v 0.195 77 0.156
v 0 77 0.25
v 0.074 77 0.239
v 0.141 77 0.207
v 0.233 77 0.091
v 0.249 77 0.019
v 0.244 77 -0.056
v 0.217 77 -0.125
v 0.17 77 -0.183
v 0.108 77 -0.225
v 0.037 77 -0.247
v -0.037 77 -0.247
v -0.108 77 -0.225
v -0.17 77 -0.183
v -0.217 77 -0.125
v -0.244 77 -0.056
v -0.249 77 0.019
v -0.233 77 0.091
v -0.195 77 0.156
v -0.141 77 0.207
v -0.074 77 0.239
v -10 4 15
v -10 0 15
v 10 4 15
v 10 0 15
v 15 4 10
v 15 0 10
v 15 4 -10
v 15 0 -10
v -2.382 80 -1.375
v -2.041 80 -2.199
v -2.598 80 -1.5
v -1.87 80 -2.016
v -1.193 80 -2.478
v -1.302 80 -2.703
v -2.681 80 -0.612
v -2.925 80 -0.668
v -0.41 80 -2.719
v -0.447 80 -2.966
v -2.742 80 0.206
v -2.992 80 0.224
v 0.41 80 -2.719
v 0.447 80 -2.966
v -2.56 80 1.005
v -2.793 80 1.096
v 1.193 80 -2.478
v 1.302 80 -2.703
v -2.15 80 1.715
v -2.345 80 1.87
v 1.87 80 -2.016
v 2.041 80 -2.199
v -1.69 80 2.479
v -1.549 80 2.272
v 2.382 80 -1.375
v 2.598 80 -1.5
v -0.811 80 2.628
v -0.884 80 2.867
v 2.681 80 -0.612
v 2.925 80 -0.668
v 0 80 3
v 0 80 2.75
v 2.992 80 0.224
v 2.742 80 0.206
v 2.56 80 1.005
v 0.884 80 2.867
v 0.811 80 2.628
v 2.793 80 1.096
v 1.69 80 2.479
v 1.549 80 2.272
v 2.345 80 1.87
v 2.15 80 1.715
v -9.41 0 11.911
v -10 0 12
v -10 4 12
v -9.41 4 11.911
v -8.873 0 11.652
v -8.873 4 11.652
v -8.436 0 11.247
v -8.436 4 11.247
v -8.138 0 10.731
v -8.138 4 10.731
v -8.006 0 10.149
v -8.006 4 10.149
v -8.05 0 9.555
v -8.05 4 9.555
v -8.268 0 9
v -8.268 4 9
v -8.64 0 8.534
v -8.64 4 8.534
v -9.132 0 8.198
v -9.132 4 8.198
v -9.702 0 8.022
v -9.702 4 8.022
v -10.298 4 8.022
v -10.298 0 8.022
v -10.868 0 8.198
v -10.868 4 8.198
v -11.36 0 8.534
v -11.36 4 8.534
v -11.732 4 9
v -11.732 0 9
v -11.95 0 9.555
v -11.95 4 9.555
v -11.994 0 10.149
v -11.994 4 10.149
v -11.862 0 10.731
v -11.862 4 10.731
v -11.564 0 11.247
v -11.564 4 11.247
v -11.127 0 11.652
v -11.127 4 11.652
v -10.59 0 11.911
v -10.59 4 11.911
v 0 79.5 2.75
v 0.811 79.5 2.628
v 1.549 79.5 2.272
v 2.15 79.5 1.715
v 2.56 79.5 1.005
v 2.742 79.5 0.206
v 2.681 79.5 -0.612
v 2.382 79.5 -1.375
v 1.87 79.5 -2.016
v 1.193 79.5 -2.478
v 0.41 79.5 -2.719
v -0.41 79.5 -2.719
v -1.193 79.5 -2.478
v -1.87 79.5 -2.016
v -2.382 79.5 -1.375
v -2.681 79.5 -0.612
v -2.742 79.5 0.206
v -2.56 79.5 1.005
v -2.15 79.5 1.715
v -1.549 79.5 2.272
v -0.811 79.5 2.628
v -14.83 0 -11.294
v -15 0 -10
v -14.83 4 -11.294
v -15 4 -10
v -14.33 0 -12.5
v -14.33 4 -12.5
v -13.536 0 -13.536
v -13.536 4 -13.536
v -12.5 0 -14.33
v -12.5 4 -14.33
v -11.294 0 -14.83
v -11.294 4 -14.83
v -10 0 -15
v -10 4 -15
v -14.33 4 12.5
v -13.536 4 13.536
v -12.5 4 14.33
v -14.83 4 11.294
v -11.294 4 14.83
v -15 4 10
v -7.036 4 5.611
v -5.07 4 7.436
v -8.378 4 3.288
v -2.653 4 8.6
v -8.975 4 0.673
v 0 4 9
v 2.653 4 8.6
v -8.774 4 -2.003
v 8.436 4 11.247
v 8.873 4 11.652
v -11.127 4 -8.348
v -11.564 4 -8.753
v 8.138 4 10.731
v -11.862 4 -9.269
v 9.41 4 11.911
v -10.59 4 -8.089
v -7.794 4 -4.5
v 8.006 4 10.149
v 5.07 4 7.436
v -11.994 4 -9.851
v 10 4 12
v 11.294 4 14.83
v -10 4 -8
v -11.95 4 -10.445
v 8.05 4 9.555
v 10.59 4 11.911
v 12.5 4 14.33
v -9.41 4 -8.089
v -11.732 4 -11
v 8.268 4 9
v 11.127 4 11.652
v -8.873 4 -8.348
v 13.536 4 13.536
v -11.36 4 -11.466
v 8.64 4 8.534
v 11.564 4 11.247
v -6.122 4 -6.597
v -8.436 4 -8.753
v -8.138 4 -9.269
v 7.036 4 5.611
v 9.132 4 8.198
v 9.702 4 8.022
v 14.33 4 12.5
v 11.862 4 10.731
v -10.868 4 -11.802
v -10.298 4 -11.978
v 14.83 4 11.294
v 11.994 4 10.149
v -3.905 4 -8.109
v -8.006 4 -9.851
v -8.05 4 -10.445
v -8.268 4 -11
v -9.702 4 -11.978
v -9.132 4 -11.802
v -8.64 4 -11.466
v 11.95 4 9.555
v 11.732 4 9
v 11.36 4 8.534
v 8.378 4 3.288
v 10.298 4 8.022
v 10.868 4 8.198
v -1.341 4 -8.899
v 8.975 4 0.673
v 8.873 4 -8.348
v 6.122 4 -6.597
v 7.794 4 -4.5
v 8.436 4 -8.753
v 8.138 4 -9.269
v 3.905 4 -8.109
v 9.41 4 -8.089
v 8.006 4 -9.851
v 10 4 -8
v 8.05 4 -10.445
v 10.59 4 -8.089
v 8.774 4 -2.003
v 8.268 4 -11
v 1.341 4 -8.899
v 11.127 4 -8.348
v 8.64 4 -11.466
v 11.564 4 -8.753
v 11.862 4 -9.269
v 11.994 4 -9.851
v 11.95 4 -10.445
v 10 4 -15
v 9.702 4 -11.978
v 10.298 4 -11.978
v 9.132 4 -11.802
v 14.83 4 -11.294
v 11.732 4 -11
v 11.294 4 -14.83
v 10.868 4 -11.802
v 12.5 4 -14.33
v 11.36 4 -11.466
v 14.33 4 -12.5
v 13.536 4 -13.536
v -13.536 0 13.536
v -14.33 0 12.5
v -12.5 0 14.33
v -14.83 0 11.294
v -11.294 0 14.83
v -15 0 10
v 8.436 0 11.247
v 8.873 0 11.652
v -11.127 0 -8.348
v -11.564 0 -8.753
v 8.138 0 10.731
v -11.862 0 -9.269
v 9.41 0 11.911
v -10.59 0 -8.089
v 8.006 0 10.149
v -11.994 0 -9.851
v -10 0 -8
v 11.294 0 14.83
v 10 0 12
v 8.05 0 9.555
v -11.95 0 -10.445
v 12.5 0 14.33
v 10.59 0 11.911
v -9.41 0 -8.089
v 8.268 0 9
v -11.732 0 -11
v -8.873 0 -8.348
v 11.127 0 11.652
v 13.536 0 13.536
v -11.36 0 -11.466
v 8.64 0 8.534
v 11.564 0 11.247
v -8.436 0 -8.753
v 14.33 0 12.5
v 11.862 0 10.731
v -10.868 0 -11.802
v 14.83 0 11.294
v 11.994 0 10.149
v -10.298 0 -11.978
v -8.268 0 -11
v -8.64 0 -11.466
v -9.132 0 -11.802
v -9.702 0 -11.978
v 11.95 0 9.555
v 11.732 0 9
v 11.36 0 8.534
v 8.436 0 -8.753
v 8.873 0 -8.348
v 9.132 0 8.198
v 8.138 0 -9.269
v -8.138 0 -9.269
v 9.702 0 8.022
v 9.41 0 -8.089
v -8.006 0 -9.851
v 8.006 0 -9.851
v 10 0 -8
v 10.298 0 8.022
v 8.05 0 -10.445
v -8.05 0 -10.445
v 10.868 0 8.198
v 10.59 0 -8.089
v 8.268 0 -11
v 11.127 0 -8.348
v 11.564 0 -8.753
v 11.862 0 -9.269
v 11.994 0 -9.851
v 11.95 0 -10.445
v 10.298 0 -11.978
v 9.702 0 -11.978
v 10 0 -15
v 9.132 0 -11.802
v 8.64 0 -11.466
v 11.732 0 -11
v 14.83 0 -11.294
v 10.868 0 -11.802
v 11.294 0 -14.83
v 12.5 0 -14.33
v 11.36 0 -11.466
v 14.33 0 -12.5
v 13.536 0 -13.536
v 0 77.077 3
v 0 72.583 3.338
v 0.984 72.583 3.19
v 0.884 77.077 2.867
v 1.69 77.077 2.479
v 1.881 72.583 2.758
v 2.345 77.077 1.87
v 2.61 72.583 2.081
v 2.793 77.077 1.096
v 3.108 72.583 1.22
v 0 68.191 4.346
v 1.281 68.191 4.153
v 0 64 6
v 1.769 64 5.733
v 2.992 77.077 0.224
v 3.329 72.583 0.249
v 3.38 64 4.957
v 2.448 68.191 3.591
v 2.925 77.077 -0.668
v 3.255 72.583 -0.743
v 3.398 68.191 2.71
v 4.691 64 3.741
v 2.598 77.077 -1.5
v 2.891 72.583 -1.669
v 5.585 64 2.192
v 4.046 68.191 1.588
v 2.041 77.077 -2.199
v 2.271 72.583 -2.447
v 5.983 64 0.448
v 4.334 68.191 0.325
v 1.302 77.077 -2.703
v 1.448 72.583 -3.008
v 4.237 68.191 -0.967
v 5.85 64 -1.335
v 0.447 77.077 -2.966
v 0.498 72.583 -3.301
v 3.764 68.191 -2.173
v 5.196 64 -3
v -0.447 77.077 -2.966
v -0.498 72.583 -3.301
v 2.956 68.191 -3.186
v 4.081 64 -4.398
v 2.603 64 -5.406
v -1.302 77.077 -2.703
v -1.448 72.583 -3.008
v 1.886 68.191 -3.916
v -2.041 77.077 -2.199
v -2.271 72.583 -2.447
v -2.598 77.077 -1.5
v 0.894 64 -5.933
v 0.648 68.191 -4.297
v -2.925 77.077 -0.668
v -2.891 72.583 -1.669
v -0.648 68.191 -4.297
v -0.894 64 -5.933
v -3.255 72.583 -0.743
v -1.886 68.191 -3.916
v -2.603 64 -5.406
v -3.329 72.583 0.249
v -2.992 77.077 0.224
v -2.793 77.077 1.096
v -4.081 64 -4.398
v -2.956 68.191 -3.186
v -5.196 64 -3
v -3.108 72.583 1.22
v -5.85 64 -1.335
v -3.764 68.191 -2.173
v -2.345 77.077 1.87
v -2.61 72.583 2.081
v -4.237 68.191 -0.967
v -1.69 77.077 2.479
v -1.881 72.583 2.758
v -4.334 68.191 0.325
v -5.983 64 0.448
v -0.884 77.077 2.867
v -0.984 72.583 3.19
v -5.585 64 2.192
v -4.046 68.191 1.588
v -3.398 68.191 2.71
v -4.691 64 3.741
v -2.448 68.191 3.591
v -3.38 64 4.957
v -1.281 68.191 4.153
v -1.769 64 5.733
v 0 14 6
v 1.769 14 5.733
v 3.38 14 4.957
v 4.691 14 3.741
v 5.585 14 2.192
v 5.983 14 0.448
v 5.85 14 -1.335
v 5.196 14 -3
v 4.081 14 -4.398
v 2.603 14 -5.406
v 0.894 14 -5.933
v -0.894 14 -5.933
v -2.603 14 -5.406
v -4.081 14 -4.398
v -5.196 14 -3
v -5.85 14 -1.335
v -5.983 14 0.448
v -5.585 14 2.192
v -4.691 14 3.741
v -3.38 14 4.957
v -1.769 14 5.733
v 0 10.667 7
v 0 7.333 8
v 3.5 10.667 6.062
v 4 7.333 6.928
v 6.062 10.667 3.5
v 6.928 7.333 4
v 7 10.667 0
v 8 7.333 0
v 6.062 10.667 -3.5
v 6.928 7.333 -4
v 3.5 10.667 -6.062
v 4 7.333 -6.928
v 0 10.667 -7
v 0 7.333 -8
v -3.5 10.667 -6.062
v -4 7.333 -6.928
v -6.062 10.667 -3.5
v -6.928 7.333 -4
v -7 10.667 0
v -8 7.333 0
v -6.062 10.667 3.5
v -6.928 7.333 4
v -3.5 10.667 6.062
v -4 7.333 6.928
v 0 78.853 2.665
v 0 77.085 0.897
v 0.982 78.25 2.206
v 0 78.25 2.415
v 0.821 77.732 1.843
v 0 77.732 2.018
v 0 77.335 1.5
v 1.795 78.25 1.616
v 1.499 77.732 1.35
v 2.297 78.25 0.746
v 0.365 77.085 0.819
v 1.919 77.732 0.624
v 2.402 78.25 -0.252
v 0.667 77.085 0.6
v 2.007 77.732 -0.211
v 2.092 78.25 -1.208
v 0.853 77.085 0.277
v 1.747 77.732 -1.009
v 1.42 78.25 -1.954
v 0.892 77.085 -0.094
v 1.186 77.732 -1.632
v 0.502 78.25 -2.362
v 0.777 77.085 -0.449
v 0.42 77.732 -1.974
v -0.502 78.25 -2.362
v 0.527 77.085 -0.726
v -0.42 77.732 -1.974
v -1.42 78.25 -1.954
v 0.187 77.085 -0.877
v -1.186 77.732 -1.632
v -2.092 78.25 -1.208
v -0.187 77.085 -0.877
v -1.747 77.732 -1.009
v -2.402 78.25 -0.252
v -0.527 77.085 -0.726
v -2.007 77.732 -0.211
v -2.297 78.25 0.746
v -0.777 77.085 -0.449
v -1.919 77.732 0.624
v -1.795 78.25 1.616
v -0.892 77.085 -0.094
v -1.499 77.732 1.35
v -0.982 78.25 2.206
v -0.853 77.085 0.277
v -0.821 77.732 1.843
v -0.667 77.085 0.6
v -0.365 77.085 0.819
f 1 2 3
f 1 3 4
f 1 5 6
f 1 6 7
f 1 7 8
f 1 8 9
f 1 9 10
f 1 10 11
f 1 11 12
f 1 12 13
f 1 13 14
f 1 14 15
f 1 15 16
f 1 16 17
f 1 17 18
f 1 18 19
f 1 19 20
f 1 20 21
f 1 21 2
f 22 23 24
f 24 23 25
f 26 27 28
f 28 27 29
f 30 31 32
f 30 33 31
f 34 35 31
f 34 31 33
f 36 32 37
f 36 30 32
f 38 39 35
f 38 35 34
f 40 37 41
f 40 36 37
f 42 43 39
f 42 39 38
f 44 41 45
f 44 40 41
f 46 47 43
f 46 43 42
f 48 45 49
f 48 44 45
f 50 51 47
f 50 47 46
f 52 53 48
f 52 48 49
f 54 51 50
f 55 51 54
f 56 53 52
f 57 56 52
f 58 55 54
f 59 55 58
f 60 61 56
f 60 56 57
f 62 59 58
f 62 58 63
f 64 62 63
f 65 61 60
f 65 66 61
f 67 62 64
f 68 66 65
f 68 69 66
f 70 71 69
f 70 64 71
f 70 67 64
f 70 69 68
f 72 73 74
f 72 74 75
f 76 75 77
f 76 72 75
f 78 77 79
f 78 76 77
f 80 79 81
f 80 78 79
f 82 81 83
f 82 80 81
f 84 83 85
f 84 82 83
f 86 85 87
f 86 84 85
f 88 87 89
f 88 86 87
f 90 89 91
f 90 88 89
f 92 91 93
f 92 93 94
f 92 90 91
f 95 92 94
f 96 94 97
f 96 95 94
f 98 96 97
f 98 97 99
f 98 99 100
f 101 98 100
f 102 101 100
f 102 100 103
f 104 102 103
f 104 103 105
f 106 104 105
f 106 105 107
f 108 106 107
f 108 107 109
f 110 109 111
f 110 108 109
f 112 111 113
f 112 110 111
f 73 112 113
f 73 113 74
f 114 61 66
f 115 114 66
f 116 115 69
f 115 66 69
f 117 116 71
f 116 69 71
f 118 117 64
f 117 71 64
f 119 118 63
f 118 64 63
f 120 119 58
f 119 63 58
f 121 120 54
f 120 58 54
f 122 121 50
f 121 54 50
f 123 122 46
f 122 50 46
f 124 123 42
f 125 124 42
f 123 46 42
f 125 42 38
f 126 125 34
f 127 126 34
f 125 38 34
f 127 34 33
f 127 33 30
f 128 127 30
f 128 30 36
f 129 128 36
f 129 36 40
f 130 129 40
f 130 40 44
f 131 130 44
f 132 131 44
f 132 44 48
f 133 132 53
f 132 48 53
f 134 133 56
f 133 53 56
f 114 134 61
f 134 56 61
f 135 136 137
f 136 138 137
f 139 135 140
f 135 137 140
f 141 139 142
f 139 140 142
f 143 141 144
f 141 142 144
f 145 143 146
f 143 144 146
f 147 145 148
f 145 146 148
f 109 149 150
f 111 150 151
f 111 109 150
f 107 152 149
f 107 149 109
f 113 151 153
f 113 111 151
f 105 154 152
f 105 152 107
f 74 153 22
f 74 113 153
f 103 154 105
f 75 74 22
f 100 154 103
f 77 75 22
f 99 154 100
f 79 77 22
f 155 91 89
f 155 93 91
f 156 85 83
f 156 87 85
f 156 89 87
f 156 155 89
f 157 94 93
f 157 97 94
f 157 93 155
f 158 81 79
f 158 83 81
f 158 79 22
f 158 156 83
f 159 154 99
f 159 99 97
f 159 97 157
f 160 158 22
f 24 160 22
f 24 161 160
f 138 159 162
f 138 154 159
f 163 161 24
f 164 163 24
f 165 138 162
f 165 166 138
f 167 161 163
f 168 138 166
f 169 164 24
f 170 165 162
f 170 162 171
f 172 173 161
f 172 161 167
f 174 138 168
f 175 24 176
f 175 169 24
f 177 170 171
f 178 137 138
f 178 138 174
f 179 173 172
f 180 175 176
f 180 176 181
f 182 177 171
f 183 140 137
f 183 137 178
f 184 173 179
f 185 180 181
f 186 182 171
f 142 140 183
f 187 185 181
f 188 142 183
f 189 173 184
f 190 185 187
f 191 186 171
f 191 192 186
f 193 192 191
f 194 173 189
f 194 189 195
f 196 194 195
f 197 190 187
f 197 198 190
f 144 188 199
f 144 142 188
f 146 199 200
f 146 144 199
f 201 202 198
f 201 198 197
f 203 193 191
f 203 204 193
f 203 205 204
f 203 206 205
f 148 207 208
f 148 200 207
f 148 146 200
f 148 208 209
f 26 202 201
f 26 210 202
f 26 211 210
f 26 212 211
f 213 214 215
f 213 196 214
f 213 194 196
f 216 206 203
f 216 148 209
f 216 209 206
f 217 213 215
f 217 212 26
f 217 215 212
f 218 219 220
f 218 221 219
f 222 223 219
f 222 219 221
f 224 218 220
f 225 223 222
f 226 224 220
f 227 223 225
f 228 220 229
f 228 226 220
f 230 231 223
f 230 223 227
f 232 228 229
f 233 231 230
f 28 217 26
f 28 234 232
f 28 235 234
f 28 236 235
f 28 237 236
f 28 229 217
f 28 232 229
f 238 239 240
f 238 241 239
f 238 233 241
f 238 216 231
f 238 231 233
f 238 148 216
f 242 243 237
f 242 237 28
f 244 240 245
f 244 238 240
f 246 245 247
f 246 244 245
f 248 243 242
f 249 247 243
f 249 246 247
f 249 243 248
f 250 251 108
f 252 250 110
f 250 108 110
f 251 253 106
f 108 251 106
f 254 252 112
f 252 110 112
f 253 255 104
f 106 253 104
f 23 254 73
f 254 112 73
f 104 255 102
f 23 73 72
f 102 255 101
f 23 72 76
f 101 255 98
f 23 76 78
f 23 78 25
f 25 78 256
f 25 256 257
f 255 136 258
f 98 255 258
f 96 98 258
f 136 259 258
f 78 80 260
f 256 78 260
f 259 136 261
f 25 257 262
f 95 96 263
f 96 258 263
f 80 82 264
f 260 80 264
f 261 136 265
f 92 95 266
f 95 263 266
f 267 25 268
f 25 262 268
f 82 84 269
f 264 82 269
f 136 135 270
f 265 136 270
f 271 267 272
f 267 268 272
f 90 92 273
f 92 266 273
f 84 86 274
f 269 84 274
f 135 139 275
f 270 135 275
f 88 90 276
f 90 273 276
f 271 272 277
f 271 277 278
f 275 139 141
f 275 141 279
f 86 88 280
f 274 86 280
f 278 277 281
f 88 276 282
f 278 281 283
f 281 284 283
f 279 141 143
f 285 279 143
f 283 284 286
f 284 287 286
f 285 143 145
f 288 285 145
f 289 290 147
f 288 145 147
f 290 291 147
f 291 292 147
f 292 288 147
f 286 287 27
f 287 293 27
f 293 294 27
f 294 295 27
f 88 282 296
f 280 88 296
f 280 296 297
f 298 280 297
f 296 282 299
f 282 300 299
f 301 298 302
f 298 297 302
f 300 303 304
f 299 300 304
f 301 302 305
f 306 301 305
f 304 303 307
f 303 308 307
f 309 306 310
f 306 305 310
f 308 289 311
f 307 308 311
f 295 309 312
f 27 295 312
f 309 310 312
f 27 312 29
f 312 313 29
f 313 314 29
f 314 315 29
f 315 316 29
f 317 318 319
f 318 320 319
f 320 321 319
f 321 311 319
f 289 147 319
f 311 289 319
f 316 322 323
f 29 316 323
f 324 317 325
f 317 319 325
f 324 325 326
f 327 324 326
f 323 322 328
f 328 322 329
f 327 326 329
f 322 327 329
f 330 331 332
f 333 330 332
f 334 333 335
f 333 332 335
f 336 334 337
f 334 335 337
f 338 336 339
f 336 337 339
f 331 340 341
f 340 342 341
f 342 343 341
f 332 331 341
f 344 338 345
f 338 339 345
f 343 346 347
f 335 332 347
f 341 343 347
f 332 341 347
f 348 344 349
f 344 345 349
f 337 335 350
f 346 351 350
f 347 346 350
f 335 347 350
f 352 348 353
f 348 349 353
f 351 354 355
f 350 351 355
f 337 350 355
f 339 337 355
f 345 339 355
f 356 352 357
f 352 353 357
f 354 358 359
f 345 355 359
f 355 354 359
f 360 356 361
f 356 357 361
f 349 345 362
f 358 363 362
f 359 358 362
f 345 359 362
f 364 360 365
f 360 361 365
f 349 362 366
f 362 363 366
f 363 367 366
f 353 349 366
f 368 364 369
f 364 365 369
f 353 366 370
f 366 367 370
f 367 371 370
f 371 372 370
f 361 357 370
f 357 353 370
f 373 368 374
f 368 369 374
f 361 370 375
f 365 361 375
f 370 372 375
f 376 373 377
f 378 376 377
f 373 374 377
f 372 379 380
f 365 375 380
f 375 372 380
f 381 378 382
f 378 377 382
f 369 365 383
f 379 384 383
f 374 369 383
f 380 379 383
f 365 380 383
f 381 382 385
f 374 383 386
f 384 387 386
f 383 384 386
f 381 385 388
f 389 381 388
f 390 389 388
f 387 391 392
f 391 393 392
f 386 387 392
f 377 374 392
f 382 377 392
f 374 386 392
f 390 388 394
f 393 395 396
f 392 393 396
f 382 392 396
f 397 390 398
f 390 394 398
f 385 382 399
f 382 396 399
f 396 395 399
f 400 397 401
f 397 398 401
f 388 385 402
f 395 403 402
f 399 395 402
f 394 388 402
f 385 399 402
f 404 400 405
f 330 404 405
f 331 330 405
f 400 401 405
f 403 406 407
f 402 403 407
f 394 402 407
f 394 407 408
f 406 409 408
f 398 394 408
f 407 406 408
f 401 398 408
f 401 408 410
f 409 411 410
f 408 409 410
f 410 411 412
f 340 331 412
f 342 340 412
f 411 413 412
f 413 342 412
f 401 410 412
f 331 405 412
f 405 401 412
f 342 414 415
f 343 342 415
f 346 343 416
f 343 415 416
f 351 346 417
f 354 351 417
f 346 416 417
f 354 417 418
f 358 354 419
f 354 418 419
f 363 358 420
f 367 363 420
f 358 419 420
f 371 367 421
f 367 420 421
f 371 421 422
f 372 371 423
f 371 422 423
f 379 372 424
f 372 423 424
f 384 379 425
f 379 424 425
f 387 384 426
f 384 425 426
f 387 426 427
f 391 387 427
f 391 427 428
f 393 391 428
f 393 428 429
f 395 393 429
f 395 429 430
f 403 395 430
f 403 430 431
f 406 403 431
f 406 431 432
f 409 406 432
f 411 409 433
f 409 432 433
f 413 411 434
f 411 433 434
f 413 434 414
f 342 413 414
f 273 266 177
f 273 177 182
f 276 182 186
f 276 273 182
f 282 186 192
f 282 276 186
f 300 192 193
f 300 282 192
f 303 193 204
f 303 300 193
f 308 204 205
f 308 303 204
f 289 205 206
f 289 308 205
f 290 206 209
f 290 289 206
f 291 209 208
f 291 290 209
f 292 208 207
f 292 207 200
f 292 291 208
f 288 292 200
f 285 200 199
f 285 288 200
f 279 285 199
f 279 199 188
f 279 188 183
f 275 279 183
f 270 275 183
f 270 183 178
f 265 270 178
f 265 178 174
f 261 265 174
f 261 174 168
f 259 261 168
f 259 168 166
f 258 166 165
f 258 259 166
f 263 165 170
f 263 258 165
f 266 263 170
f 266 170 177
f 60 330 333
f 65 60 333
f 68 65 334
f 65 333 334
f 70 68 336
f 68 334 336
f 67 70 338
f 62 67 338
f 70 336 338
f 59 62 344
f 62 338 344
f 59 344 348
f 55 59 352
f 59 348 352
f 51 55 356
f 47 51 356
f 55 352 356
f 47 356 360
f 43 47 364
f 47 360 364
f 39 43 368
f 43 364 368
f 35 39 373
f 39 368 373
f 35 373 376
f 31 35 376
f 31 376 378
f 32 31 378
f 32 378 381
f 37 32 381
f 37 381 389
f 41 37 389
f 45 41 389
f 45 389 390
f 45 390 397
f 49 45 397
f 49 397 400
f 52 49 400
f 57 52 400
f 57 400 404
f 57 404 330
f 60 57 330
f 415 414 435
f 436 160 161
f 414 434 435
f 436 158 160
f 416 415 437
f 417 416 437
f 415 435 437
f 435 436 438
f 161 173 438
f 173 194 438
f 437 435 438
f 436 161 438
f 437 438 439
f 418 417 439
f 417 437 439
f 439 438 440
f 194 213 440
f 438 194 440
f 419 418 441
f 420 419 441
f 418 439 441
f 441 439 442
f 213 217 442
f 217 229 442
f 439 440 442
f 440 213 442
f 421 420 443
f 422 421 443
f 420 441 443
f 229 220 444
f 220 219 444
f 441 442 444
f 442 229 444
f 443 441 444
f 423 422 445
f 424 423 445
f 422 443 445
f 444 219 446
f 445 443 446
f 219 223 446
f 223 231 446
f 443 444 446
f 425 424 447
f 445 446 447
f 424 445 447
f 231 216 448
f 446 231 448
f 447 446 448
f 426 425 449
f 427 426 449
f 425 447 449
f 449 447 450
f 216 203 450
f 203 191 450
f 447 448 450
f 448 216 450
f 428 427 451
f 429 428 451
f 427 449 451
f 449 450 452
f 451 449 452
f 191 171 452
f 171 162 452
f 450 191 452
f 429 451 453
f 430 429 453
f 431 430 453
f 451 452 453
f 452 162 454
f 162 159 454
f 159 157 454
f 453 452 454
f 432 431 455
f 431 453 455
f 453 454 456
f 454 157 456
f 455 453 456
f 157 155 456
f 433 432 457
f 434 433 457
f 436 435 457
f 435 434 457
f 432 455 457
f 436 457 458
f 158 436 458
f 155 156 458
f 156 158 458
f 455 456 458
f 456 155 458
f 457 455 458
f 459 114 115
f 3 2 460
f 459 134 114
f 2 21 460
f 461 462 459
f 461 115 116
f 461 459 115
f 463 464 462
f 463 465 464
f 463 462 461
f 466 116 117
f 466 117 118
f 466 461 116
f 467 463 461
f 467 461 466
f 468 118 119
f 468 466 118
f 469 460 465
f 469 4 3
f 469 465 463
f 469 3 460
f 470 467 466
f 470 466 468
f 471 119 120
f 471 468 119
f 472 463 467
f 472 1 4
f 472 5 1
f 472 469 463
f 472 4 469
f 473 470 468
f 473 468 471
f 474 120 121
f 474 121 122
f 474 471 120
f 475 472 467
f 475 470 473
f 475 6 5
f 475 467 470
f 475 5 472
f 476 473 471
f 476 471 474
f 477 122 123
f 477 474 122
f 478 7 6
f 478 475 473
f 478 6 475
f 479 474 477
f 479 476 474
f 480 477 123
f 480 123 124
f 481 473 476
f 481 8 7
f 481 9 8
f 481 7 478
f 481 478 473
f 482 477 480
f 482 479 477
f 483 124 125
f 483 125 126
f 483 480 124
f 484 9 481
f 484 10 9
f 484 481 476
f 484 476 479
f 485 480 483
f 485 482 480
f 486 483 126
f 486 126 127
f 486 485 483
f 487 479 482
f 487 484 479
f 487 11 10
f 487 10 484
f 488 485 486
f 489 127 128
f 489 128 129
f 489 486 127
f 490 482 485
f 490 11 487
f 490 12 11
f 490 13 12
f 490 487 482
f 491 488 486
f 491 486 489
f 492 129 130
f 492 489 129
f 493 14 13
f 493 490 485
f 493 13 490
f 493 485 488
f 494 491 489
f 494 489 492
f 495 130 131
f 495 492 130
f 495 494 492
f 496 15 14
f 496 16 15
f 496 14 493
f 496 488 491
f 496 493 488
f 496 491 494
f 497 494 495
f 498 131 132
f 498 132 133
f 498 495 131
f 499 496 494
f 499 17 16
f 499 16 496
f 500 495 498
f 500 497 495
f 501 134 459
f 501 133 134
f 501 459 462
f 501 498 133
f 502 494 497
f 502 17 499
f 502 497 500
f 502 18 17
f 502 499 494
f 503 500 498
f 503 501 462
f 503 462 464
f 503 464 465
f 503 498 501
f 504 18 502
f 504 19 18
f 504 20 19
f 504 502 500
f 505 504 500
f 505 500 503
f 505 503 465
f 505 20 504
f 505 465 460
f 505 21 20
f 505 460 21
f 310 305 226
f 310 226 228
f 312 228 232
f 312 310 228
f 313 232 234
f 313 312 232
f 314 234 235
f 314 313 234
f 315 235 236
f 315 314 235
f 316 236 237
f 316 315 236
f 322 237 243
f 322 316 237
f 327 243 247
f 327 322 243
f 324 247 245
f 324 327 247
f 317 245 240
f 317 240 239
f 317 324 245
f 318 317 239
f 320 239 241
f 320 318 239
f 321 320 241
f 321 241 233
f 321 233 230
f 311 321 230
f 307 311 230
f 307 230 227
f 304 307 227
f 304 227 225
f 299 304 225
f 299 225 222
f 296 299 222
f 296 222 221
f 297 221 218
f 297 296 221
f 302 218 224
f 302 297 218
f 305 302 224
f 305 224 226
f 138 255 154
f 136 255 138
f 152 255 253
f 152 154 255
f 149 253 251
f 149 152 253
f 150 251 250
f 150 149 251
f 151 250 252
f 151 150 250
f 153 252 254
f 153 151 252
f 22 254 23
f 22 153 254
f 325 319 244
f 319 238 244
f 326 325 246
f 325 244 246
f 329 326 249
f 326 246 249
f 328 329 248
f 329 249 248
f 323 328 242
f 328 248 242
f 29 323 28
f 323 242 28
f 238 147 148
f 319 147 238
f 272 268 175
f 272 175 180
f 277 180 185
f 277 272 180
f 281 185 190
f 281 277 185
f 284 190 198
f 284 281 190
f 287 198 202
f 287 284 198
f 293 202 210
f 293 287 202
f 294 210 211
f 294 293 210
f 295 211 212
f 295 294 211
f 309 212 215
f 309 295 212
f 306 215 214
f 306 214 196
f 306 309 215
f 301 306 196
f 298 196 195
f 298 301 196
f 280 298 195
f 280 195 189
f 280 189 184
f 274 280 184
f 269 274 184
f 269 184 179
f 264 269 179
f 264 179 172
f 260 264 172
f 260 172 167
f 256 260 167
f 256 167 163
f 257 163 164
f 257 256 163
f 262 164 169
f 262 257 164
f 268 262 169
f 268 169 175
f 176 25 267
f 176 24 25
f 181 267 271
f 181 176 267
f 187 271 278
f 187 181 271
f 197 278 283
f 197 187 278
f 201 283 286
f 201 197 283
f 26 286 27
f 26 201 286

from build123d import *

# Parameters (mm, degrees)
SKETCH_1_W          = 30
SKETCH_1_H          = 30
SKETCH_1_R          = 2
EXTRUDE_1_DEPTH     = 4
FILLET_1_R          = 5
SKETCH_2_R          = 6
EXTRUDE_2_DEPTH     = 60
SKETCH_3_R          = 3
EXTRUDE_3_DEPTH     = 16
FILLET_2_R          = 30
SKETCH_4_R          = 2.75
CUT_EXTRUDE_1_DEPTH = 3
FILLET_3_R          = 2.5
CHAMFER_4_SIZE      = 10
CHAMFER_4_SIZE2     = 3


with BuildPart() as part:
    # Эскиз1 → Бобышка-Вытянуть1 (new body)
    with BuildSketch(Plane(origin=(0, 0, 0), x_dir=(1, 0, 0), z_dir=(0, 1, 0))):
        Rectangle(SKETCH_1_W, SKETCH_1_H)
        with Locations(Location((-10, 10, 0), (0, 0, 270))):
            Circle(SKETCH_1_R, mode=Mode.SUBTRACT)
        with Locations(Location((10, 10, 0), (0, 0, 270))):
            Circle(SKETCH_1_R, mode=Mode.SUBTRACT)
        with Locations(Location((10, -10, 0), (0, 0, 270))):
            Circle(SKETCH_1_R, mode=Mode.SUBTRACT)
        with Locations(Location((-10, -10, 0), (0, 0, 270))):
            Circle(SKETCH_1_R, mode=Mode.SUBTRACT)
    extrude(amount=EXTRUDE_1_DEPTH)

    # Скругление1
    fillet_1_edges = [part.edges().sort_by_distance(p)[0] for p in [
        (15, 2, 15),
        (-15, 2, 15),
        (-15, 2, -15),
        (15, 2, -15),
    ]]
    fillet(fillet_1_edges, radius=FILLET_1_R)

    # Эскиз2 → Бобышка-Вытянуть2 (add)
    with BuildSketch(Plane(origin=(0, 4, 0), x_dir=(1, 0, 0), z_dir=(0, 1, 0))):
        with Locations(Location((0, 0, 0), (0, 0, 270))):
            Circle(SKETCH_2_R)
    extrude(amount=EXTRUDE_2_DEPTH)

    # Эскиз3 → Бобышка-Вытянуть3 (add)
    with BuildSketch(Plane(origin=(0, 64, 0), x_dir=(1, 0, 0), z_dir=(0, 1, 0))):
        with Locations(Location((0, 0, 0), (0, 0, 270))):
            Circle(SKETCH_3_R)
    extrude(amount=EXTRUDE_3_DEPTH)

    # Скругление2
    # the kernel refuses this fillet: 30 mm, written as the material it adds along each edge
    with BuildSketch(Plane(origin=(0, 64, 0), x_dir=(0, 0, 1), z_dir=(-1, 0, 0))) as fillet_2_piece_1:
        with BuildLine():
            CenterArc((33, 13.076696831), FILLET_2_R, 180, 25.841932763)
            Line((3, 13.076696831), (2.4, 13.076696831))
            Line((2.4, 13.076696831), (2.4, 0))
            Line((2.4, 0), (3, -0.6))
            ThreePointArc((3, -0.6), (4.5, -0.6), (5.46, -0.261533937))
            Line((5.46, -0.261533937), (6, 0))
        make_face()
    revolve(axis=Axis((0, 64, 0), (0, 1, 0)))

    # Эскиз4 → Вырез-Вытянуть1 (cut)
    with BuildSketch(Plane(origin=(0, 80, 0), x_dir=(1, 0, 0), z_dir=(0, 1, 0))):
        with Locations(Location((0, 0, 0), (0, 0, 270))):
            Circle(SKETCH_4_R)
    extrude(amount=-CUT_EXTRUDE_1_DEPTH, mode=Mode.SUBTRACT)

    # Скругление3
    fillet_3_edges = [part.edges().sort_by_distance(p)[0] for p in [
        (0, 77, -2.75),
    ]]
    fillet(fillet_3_edges, radius=FILLET_3_R)

    # Chamfer 4
    chamfer_4_edges = [part.edges().sort_by_distance(p)[0] for p in [
        (0, 4, -6),
    ]]
    chamfer_4_side = [part.faces().sort_by_distance(p)[0] for p in [
        (0, 34, -6),
    ]]
    chamfer(chamfer_4_edges, length=CHAMFER_4_SIZE, length2=CHAMFER_4_SIZE2, reference=chamfer_4_side[0])


solid = part.part
